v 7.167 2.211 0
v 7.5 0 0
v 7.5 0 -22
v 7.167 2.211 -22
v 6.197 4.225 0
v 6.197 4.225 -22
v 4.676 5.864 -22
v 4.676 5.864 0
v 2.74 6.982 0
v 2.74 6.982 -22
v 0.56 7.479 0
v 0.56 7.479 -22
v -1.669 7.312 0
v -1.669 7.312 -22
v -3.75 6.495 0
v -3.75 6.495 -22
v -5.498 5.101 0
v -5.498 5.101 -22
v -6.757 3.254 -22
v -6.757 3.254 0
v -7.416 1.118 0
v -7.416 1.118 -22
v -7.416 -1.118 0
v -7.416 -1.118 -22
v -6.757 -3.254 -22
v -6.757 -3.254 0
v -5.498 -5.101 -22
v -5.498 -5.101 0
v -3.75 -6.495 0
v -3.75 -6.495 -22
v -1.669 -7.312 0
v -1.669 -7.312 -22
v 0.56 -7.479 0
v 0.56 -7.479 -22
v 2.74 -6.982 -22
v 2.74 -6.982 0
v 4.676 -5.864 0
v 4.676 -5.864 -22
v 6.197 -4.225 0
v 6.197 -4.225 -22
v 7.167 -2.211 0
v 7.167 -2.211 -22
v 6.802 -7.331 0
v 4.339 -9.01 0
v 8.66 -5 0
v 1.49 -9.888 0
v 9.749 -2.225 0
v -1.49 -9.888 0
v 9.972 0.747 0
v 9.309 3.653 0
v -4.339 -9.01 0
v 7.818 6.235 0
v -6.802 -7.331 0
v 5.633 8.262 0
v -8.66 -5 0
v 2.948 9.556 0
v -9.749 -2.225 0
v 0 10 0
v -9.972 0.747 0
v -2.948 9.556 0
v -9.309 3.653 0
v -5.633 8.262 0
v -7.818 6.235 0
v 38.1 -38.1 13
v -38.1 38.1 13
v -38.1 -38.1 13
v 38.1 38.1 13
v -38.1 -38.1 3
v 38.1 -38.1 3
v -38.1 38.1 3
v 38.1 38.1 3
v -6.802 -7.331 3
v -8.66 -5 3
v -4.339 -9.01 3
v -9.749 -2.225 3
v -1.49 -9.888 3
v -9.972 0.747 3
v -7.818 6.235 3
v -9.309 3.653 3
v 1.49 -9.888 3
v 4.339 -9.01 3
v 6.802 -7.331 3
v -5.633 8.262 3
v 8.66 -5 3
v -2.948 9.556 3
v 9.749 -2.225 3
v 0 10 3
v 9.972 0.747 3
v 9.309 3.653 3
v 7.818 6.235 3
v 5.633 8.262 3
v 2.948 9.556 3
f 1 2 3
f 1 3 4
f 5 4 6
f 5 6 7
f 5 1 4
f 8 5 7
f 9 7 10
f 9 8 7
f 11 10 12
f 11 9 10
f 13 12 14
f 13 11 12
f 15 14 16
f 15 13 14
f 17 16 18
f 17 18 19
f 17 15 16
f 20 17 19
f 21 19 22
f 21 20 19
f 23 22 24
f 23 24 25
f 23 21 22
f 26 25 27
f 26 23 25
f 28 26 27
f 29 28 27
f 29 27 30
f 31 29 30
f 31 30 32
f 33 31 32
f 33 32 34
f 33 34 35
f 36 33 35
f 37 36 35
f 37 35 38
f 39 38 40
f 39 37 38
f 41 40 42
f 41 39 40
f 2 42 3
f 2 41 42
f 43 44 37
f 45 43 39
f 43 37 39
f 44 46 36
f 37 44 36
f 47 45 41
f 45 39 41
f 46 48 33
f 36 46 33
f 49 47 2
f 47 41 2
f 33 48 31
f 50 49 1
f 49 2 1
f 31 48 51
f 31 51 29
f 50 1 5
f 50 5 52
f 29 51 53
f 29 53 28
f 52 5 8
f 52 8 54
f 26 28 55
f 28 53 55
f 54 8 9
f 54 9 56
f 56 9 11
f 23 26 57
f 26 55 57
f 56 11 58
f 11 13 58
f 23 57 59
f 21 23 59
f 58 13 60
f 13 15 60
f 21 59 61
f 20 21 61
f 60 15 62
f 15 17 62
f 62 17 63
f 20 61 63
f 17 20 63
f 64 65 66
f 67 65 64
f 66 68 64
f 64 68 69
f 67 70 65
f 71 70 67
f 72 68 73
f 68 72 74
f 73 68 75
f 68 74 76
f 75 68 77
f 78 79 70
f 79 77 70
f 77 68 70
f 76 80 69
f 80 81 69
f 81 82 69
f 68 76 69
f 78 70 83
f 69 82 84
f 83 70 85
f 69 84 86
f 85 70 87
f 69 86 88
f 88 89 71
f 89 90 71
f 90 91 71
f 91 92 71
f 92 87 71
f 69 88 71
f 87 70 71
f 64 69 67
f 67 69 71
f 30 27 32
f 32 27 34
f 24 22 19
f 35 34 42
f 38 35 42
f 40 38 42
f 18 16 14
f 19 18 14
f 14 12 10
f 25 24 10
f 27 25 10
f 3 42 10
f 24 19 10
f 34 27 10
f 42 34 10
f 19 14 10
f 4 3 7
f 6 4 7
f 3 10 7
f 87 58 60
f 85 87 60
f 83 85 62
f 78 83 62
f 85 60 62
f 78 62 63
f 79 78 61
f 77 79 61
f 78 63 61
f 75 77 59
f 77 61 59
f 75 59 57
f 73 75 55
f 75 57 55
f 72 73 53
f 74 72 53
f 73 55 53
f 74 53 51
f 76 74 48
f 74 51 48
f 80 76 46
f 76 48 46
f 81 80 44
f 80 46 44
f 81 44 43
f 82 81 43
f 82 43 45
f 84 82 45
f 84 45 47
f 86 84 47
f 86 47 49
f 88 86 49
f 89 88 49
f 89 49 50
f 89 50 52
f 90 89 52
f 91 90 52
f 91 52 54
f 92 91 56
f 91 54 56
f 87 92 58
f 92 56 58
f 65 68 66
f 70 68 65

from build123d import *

# Parameters (mm, degrees)
SKETCH1_R           = 7.5
BOSS_EXTRUDE1_DEPTH = 22
SKETCH2_R           = 10
BOSS_EXTRUDE2_DEPTH = 3
SKETCH3_W           = 76.2
SKETCH3_H           = 76.2
BOSS_EXTRUDE3_DEPTH = 10


with BuildPart() as part:
    # Sketch1 → Boss-Extrude1 (new body)
    with BuildSketch(Plane.XY):
        Circle(SKETCH1_R)
    extrude(amount=-BOSS_EXTRUDE1_DEPTH)

    # Sketch2 → Boss-Extrude2 (add)
    with BuildSketch(Plane.XY):
        with Locations(Location((0, 0, 0), (0, 0, 90))):
            Circle(SKETCH2_R)
    extrude(amount=BOSS_EXTRUDE2_DEPTH)

    # Sketch3 → Boss-Extrude3 (add)
    with BuildSketch(Plane.XY.offset(3)):
        Rectangle(SKETCH3_W, SKETCH3_H)
    extrude(amount=BOSS_EXTRUDE3_DEPTH)


solid = part.part
